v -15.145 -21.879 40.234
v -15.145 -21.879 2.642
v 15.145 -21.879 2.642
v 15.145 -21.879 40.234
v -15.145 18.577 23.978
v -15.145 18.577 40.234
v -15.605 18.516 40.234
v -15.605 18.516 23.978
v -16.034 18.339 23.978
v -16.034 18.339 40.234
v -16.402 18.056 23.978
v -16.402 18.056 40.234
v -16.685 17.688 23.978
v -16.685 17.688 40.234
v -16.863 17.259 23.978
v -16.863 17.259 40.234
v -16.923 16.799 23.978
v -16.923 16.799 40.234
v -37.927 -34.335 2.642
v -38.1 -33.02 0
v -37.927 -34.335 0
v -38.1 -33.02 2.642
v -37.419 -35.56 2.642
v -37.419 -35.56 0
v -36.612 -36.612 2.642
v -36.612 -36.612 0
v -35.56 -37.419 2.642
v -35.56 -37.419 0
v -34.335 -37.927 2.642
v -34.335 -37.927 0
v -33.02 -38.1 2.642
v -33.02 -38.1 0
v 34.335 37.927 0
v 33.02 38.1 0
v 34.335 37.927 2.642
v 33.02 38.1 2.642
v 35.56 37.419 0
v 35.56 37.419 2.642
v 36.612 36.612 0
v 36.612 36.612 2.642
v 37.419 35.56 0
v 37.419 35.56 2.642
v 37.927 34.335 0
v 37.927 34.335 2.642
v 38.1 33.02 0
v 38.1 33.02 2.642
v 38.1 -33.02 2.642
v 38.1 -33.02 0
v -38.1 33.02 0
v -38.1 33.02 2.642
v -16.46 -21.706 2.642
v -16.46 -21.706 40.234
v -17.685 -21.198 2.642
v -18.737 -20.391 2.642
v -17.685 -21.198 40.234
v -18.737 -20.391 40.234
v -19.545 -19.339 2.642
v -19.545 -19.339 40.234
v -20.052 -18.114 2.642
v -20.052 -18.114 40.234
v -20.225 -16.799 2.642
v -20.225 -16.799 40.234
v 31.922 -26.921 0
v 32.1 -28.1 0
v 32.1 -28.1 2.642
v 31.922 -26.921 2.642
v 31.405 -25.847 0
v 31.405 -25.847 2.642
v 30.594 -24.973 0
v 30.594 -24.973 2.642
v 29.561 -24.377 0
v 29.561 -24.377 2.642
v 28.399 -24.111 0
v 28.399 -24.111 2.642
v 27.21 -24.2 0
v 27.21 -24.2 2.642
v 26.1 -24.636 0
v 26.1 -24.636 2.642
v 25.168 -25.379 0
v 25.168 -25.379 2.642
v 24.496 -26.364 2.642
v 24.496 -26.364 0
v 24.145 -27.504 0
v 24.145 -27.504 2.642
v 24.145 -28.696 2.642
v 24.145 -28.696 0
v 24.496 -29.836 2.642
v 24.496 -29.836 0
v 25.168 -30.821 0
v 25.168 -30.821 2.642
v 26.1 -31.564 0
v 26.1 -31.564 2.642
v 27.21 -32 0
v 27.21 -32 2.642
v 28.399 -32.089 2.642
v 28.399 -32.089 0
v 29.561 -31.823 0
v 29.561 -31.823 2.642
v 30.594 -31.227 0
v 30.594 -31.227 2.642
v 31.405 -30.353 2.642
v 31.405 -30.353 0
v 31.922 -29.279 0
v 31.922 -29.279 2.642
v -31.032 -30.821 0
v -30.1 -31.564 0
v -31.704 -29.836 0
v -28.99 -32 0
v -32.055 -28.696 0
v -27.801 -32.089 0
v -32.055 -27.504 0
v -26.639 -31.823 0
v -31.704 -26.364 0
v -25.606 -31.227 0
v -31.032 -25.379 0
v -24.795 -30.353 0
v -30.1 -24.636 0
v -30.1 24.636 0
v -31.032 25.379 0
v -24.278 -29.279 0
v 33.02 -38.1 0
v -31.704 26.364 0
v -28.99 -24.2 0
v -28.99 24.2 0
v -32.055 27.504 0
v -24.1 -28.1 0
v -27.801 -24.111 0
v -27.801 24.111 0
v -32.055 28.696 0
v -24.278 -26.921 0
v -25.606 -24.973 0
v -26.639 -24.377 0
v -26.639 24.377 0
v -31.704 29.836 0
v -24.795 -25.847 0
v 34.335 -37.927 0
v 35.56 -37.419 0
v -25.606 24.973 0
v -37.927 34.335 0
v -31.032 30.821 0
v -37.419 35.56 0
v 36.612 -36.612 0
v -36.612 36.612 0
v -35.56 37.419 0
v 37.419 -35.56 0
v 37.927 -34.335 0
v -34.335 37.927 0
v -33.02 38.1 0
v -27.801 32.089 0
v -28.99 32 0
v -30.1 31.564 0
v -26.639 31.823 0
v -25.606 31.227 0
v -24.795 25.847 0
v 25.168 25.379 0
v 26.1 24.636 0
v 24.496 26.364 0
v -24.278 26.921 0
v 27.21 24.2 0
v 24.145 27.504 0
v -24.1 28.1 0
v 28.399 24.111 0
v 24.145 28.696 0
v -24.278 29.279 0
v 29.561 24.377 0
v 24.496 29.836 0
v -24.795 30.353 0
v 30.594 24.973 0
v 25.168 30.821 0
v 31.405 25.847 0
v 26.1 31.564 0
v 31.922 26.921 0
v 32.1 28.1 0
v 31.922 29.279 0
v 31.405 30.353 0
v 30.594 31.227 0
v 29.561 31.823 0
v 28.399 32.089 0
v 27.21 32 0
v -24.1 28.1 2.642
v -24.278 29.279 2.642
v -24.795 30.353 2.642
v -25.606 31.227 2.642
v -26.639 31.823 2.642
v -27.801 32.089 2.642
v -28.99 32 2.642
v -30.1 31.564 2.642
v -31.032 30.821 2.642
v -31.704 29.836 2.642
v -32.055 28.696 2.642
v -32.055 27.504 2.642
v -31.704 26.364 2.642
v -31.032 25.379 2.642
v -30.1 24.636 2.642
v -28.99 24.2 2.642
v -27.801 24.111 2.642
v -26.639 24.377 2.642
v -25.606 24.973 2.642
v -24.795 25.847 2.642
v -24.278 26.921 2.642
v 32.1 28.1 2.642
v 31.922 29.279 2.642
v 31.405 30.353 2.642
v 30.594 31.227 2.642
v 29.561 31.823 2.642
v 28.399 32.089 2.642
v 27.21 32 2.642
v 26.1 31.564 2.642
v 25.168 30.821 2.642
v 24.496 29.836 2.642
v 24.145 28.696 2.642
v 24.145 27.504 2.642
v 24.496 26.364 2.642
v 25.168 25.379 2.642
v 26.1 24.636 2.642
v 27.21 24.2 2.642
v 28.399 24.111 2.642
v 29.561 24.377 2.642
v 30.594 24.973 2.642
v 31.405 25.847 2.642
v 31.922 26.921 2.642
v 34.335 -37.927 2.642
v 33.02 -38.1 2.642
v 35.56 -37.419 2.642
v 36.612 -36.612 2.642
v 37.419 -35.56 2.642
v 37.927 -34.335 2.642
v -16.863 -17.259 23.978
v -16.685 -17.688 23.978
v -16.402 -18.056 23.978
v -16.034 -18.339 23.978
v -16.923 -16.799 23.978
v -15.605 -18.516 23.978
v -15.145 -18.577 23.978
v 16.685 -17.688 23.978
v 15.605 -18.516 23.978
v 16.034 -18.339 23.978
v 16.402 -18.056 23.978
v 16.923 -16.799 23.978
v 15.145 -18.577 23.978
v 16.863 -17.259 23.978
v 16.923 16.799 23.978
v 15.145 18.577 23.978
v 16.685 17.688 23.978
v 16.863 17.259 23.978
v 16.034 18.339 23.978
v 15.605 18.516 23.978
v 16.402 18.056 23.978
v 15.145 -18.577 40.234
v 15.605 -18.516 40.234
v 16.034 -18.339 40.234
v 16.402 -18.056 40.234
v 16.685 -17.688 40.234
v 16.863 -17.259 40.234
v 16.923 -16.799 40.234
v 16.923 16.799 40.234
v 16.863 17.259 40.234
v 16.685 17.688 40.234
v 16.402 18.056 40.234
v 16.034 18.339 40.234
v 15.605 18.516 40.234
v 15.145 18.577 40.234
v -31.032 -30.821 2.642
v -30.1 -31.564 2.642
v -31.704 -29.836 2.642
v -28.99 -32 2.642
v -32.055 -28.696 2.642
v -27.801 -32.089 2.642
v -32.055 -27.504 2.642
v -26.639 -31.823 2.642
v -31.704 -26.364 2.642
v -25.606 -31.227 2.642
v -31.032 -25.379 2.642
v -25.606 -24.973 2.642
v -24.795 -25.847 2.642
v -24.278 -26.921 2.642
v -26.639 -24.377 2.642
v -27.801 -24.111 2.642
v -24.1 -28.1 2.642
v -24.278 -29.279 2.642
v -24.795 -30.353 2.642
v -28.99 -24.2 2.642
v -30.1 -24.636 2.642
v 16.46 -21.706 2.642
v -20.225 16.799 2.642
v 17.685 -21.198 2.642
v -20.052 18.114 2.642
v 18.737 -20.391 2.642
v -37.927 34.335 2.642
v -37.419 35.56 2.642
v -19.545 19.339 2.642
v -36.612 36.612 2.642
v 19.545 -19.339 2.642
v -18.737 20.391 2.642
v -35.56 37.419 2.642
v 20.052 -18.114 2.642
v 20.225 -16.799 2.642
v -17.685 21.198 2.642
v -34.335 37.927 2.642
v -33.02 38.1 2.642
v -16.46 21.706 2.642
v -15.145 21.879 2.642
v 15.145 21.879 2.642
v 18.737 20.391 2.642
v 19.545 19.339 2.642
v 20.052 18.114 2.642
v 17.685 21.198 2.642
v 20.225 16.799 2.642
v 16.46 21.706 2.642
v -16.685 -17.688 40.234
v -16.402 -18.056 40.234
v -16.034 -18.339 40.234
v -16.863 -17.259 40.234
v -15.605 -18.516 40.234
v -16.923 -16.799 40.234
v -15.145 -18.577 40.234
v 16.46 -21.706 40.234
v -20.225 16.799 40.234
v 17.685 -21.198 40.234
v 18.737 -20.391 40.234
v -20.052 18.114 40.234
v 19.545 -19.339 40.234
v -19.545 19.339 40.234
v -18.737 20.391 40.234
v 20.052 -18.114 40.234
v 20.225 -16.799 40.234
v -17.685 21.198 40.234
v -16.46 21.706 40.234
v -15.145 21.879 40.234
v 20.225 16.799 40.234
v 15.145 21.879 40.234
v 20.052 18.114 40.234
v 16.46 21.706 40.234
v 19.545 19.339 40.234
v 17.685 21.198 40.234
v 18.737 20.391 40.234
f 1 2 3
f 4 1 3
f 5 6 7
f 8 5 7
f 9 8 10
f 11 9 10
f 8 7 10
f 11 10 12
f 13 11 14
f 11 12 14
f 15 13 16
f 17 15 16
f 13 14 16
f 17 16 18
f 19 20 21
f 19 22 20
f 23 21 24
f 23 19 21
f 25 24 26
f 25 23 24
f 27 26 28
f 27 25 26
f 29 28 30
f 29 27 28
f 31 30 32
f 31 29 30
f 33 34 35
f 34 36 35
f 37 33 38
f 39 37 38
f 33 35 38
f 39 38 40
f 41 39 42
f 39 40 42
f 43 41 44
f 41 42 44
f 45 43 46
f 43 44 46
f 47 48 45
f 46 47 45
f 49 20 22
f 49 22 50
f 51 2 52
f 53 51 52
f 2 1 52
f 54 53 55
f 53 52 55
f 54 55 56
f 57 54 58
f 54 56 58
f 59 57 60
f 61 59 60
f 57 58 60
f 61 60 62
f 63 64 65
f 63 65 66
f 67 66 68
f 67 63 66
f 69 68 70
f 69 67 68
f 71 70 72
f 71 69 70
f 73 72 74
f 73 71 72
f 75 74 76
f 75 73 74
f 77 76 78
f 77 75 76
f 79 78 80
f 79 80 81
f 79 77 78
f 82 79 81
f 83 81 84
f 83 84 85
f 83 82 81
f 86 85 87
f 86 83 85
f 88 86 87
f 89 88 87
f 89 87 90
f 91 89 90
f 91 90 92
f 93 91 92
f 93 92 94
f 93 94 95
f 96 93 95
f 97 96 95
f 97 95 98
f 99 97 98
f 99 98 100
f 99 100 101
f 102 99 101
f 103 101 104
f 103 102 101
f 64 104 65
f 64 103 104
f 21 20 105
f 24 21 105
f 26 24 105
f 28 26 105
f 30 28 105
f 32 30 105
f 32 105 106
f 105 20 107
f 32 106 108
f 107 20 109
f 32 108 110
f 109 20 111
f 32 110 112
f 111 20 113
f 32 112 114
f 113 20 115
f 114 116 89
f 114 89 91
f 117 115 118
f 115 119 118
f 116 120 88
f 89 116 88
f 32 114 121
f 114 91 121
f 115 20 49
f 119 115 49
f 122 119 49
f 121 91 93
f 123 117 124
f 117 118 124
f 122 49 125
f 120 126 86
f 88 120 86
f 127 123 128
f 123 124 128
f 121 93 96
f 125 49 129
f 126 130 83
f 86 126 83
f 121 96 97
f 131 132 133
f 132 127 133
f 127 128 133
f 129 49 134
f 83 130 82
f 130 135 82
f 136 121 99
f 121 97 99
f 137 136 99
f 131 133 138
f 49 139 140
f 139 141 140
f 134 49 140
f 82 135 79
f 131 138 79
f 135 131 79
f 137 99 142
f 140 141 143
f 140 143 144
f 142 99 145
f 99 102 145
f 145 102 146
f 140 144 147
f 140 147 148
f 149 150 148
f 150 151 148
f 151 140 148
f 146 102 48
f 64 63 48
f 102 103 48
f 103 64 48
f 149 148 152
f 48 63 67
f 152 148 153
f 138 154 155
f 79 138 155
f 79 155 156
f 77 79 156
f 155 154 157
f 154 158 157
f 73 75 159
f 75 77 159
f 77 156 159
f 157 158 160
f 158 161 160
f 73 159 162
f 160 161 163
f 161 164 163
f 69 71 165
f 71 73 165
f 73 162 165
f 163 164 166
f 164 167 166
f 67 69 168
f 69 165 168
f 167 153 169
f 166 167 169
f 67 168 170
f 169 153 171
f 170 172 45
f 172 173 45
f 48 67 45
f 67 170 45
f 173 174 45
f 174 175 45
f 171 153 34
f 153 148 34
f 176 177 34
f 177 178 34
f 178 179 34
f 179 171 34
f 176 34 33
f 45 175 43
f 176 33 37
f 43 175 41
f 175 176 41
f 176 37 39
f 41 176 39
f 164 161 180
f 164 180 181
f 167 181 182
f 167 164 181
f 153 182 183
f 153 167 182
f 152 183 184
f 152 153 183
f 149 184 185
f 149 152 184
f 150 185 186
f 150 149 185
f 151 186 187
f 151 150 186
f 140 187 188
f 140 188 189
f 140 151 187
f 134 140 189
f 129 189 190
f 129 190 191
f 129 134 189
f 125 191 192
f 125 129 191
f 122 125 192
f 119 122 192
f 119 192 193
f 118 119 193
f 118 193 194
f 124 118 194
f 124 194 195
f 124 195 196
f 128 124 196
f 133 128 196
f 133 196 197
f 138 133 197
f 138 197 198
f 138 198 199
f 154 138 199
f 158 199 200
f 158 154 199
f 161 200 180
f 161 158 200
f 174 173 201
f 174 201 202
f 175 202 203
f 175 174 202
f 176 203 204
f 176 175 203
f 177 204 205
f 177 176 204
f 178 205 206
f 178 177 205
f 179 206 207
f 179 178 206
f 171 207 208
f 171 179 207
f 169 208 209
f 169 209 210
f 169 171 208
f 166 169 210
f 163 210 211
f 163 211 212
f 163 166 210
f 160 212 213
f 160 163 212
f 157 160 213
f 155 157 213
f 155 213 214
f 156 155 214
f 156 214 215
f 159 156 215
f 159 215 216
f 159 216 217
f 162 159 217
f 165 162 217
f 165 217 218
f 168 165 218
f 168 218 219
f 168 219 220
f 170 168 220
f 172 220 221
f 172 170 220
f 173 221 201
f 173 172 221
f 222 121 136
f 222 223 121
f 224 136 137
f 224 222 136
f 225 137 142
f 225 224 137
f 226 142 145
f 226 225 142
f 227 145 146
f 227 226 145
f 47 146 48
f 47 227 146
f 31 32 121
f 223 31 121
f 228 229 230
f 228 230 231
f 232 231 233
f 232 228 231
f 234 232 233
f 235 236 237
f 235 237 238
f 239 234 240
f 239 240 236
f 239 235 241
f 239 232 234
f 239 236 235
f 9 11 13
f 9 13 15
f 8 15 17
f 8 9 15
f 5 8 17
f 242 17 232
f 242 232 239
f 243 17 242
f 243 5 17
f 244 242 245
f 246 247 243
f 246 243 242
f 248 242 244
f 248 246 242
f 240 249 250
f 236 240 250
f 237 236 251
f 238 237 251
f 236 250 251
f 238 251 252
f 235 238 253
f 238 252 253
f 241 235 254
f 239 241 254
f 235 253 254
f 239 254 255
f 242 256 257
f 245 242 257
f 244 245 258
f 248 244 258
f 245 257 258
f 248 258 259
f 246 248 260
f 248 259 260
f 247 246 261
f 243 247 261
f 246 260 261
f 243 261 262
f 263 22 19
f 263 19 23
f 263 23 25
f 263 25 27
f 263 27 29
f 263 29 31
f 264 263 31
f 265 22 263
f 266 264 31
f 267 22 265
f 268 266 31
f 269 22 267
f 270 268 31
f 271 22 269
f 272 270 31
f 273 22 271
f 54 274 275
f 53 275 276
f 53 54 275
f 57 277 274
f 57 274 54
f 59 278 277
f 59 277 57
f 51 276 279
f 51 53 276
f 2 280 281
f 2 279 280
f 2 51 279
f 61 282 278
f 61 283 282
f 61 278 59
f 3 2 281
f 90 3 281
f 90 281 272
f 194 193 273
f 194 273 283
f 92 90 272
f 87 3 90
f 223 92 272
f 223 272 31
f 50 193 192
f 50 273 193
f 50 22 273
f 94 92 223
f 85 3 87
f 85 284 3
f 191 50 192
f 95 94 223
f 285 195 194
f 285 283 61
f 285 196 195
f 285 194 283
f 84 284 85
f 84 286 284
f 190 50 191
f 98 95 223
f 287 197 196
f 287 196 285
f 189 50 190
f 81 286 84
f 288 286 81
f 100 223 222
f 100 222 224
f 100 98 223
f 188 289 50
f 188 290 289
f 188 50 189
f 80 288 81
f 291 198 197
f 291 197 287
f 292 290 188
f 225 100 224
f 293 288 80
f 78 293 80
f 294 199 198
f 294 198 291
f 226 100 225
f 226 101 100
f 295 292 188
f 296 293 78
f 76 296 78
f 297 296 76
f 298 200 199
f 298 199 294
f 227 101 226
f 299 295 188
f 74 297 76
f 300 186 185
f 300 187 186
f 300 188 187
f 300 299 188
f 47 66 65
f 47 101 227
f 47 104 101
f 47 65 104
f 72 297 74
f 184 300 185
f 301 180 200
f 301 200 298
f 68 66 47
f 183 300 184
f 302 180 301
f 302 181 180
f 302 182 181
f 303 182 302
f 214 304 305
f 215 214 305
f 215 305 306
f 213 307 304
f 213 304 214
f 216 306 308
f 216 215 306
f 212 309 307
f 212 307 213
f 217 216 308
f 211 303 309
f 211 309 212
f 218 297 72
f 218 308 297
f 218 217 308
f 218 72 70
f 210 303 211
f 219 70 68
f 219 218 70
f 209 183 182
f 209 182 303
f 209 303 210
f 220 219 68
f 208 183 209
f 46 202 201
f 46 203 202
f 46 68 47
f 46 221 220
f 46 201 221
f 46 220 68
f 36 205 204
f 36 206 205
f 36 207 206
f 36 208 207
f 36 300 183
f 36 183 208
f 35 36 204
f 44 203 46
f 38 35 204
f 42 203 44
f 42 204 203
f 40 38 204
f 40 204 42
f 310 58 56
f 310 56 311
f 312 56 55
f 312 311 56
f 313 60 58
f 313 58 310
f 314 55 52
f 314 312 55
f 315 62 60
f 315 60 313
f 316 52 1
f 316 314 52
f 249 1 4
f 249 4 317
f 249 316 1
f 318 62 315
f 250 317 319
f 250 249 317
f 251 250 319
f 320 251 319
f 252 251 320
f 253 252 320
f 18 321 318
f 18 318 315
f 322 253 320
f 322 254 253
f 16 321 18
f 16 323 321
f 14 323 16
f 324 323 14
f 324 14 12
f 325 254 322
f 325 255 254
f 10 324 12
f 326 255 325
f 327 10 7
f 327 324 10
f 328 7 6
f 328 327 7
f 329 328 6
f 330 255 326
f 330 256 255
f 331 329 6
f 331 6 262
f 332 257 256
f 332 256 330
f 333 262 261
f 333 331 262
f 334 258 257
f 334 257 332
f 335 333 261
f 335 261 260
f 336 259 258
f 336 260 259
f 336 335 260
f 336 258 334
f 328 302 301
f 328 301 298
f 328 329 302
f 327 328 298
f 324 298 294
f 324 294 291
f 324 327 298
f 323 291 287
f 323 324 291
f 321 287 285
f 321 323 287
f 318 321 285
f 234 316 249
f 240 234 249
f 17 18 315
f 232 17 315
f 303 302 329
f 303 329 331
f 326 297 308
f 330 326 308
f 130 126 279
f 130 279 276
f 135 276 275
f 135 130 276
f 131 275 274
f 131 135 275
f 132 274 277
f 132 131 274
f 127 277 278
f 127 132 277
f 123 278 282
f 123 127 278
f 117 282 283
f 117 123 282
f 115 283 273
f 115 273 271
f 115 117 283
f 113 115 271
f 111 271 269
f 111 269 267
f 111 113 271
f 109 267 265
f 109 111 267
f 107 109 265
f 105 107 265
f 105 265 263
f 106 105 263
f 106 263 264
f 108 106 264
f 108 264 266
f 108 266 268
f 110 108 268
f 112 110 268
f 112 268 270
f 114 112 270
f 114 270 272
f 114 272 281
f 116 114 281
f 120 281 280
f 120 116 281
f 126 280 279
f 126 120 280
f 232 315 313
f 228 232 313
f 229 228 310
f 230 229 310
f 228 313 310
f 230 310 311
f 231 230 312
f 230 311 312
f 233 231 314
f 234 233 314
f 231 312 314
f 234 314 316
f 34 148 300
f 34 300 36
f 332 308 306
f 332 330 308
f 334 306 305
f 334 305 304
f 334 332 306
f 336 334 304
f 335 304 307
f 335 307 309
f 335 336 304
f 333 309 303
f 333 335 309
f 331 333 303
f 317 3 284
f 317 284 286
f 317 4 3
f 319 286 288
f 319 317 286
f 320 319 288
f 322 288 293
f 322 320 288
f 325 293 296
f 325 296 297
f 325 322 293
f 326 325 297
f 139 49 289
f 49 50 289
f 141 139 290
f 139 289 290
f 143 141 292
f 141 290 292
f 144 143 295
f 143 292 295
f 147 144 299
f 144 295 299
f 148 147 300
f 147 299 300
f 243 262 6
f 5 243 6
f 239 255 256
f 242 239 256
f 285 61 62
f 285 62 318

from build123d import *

# Parameters (mm, degrees)
F0_W     = 76.2
F0_H     = 76.2
F0_R     = 4
F1_DEPTH = 2.6416
F2_R     = 5.08
F3_W     = 40.450208
F3_H     = 43.757458
F4_DEPTH = 37.592
F5_R     = 5.08
F7_DEPTH = 16.256


with BuildPart() as f1:
    # F0 (on Top) → F1 (new body)
    with BuildSketch(Plane.XY):
        Rectangle(F0_W, F0_H)
        with Locations((-28.1, -28.1)):
            Circle(F0_R, mode=Mode.SUBTRACT)
        with Locations((28.1, -28.1)):
            Circle(F0_R, mode=Mode.SUBTRACT)
        with Locations((-28.1, 28.1)):
            Circle(F0_R, mode=Mode.SUBTRACT)
        with Locations((28.1, 28.1)):
            Circle(F0_R, mode=Mode.SUBTRACT)
    extrude(amount=F1_DEPTH)

    # F2
    f2_edges = [f1.edges().sort_by_distance(p)[0] for p in [
        (-38.1, -38.1, 1.3208),
        (38.1, -38.1, 1.3208),
        (38.1, 38.1, 1.3208),
        (-38.1, 38.1, 1.3208),
    ]]
    fillet(f2_edges, radius=F2_R)

    # F3 (on face) → F4 (join)
    with BuildSketch(Plane.XY.offset(2.6416)):
        Rectangle(F3_W, F3_H)
    extrude(amount=F4_DEPTH)

    # F5
    f5_edges = [f1.edges().sort_by_distance(p)[0] for p in [
        (-20.225104, -21.878729, 21.4376),
        (20.225104, -21.878729, 21.4376),
        (20.225104, 21.878729, 21.4376),
        (-20.225104, 21.878729, 21.4376),
    ]]
    fillet(f5_edges, radius=F5_R)

    # F6 (on face) → F7 (cut)
    with BuildSketch(Plane.XY.offset(40.2336)):
        with BuildLine():
            Line((-16.923103, 16.798729), (-16.923103, -16.798729))
            ThreePointArc((-16.923103, -16.798729), (-16.402339, -18.055964), (-15.145104, -18.576728))
            Line((-15.145104, -18.576728), (15.145104, -18.576728))
            ThreePointArc((15.145104, -18.576728), (16.402339, -18.055964), (16.923103, -16.798729))
            Line((16.923103, -16.798729), (16.923103, 16.798729))
            ThreePointArc((16.923103, 16.798729), (16.402339, 18.055964), (15.145104, 18.576728))
            Line((15.145104, 18.576728), (-15.145104, 18.576728))
            ThreePointArc((-15.145104, 18.576728), (-16.402339, 18.055964), (-16.923103, 16.798729))
        make_face()
    extrude(amount=-F7_DEPTH, mode=Mode.SUBTRACT)


solid = f1.part
